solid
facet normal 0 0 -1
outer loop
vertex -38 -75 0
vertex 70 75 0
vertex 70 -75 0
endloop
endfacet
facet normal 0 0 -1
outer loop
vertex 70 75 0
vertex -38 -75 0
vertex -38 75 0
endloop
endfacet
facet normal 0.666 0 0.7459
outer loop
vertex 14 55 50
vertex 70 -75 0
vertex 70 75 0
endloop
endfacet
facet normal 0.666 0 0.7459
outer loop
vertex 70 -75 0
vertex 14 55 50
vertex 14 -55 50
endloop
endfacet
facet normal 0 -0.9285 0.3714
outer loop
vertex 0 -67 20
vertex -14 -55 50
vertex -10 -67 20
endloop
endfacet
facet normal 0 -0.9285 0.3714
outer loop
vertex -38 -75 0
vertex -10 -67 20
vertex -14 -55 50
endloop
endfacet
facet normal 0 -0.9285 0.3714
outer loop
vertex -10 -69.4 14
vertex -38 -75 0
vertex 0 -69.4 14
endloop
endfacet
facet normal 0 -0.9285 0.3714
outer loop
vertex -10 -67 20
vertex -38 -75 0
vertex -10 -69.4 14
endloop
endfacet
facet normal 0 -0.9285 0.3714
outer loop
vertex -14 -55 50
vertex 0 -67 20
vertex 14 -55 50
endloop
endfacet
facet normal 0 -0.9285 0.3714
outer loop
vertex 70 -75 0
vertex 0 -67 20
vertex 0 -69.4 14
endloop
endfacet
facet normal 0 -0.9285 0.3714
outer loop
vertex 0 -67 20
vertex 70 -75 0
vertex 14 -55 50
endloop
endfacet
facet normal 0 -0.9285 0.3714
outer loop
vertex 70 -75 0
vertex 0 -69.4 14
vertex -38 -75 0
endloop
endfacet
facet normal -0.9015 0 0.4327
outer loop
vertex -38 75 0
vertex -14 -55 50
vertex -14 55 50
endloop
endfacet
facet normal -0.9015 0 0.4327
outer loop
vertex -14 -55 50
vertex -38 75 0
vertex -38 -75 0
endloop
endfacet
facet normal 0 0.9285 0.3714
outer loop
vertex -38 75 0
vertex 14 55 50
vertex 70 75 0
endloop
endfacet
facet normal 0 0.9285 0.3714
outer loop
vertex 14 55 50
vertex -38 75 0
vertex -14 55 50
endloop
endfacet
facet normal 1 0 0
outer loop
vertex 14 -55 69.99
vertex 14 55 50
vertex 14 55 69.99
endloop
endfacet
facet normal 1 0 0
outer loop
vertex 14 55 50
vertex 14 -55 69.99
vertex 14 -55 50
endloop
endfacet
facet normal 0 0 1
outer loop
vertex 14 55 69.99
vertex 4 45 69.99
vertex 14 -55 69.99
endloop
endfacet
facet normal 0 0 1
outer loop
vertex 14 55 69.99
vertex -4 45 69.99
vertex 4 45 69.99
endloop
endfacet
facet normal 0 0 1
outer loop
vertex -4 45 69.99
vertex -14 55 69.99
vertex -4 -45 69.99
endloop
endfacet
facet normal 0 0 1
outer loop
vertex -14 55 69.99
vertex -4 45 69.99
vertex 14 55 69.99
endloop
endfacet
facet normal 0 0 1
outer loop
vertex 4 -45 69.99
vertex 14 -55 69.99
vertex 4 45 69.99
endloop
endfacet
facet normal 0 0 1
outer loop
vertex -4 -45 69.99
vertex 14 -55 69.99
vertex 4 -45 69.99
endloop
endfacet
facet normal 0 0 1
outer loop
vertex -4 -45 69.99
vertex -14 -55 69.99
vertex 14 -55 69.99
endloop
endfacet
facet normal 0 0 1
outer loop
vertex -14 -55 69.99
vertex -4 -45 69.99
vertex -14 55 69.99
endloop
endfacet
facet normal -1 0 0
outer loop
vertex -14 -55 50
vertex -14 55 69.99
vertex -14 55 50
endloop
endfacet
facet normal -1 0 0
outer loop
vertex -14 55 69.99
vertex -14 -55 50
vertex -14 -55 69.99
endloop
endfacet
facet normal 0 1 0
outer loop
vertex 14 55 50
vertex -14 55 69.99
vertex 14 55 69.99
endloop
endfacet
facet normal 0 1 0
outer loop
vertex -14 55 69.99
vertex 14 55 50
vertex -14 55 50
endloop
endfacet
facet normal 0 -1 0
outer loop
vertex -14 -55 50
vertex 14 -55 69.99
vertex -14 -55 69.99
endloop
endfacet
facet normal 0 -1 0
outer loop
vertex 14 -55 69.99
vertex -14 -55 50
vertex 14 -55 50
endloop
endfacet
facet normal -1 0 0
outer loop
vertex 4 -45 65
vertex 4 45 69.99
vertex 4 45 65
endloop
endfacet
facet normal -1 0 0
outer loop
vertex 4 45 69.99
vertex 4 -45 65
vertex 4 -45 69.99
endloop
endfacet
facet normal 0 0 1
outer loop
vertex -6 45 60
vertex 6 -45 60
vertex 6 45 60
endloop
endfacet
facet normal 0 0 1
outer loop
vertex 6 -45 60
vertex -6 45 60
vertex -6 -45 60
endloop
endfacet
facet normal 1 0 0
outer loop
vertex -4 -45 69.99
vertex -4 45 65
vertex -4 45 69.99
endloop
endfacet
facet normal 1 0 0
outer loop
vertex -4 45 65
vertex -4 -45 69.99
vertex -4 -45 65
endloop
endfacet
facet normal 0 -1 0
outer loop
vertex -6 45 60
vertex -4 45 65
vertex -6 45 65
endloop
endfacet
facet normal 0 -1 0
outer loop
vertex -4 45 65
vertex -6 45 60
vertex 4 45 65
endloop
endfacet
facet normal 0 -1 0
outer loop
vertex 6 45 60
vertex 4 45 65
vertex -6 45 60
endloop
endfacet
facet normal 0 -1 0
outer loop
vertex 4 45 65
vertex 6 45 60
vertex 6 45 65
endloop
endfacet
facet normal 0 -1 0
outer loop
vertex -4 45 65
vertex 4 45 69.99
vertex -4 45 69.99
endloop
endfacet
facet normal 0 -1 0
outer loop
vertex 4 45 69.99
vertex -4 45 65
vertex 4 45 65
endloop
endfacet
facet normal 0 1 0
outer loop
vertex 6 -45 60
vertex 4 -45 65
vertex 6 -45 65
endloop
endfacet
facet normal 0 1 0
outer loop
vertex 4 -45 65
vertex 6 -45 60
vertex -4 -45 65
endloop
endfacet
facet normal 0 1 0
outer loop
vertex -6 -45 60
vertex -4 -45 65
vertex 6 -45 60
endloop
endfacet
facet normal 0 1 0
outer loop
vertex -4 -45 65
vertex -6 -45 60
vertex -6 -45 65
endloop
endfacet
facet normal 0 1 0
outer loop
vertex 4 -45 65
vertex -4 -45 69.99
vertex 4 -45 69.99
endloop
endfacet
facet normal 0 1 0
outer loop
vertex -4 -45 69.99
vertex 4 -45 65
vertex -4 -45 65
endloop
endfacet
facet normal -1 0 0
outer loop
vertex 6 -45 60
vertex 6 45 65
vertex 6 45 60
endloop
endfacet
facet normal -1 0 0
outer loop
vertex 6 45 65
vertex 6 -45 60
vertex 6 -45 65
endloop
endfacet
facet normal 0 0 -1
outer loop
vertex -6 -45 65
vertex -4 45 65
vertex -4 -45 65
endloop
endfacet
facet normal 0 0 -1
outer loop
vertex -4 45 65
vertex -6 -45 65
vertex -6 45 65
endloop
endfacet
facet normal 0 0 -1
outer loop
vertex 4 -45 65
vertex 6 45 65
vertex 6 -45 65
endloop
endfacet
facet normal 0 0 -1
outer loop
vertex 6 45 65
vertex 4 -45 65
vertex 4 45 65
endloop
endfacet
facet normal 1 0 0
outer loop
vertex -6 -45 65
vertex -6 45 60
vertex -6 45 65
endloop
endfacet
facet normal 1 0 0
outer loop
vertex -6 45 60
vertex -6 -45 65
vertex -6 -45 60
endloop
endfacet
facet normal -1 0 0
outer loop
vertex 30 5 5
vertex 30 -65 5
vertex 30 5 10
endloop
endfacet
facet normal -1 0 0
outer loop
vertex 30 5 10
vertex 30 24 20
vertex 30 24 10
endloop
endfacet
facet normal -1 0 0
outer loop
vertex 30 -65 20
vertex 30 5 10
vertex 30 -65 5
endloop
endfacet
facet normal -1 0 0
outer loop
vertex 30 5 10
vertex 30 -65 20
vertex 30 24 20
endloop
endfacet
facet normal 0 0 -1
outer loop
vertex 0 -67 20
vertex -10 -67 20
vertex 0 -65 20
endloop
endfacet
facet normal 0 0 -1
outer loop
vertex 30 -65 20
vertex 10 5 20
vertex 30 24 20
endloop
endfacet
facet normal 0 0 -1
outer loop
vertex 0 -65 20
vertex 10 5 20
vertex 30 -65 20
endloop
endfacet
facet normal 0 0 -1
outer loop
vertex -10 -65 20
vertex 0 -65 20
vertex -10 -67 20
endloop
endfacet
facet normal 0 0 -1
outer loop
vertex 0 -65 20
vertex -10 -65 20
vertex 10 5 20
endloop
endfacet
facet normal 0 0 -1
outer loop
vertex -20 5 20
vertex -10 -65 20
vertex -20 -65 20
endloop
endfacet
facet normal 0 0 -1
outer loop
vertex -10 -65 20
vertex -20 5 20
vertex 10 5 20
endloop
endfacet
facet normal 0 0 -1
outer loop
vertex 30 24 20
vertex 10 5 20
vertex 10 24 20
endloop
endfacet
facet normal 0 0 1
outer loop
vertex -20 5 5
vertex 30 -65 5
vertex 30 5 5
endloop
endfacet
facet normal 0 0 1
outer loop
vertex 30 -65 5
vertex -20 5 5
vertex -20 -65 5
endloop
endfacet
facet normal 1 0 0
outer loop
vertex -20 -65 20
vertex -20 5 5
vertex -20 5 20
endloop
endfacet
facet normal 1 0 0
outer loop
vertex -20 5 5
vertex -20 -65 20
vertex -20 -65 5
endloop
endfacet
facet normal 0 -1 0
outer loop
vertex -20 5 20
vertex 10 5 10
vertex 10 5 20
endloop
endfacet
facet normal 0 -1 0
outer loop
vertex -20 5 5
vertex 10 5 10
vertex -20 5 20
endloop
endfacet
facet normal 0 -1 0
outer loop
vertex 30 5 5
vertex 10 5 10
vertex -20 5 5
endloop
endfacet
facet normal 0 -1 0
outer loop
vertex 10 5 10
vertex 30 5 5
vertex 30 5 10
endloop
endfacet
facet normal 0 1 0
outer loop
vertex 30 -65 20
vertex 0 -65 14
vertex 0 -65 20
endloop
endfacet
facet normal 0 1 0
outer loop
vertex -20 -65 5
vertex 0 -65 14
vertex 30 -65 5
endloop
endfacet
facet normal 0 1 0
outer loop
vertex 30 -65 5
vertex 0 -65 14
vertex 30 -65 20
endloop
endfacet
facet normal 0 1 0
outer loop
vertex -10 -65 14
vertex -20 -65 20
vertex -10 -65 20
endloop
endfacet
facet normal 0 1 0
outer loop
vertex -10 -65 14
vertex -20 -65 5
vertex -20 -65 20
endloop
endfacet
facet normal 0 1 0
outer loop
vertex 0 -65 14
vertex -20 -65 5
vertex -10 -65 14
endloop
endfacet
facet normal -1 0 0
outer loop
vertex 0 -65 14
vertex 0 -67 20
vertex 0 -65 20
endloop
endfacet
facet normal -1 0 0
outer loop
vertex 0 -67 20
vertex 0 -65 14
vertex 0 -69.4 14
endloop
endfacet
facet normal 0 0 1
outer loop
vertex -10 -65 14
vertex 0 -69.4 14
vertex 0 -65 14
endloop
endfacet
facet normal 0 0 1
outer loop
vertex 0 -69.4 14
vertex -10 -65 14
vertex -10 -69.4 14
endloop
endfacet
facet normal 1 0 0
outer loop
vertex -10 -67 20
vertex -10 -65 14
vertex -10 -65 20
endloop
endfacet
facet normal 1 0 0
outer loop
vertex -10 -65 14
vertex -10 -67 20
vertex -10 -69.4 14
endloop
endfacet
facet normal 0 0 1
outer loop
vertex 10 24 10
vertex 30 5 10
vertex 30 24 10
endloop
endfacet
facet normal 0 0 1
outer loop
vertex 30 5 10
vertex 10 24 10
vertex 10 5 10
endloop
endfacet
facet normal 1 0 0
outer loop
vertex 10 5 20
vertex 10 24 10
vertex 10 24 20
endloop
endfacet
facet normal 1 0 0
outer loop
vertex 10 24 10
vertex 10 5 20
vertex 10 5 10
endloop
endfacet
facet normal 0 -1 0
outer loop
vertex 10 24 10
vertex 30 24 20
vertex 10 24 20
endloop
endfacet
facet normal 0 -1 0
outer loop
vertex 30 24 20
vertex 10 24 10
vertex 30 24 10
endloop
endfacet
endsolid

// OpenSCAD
// file: scheda_forata.scad
/*
3D printable base for a CNC milled lamp
Copyright ©2021 Massimo Gismondi

This program is free software: you can redistribute it and/or modify
it under the terms of the GNU General Public License as published by
the Free Software Foundation, either version 3 of the License, or
(at your option) any later version.

This program is distributed in the hope that it will be useful,
but WITHOUT ANY WARRANTY; without even the implied warranty of
MERCHANTABILITY or FITNESS FOR A PARTICULAR PURPOSE.  See the
GNU General Public License for more details.

You should have received a copy of the GNU General Public License
along with this program.  If not, see <https://www.gnu.org/licenses/>.

*/


module scheda_forata(scheda_larg, scheda_lung)
{
    color([0,0.7 ,0])
    {   
        union()
        {
            // Basetta forata con saldature
            cube([scheda_larg, scheda_lung, 15]);
        
            //Porta usb
            translate([10, -10, 9])
                {
                 cube([10,20,6]);
            };
        
            // Spazio cavi in uscita
            translate([scheda_larg-20, scheda_lung-1, 5])
            {
                 cube([20,20,10]);
            };
        };
    };
};
// file: base_miroku.scad
/*
3D printable base for a CNC milled lamp
Copyright ©2021 Massimo Gismondi

This program is free software: you can redistribute it and/or modify
it under the terms of the GNU General Public License as published by
the Free Software Foundation, either version 3 of the License, or
(at your option) any later version.

This program is distributed in the hope that it will be useful,
but WITHOUT ANY WARRANTY; without even the implied warranty of
MERCHANTABILITY or FITNESS FOR A PARTICULAR PURPOSE.  See the
GNU General Public License for more details.

You should have received a copy of the GNU General Public License
along with this program.  If not, see <https://www.gnu.org/licenses/>.

*/

module base(basi, basi_sopra, altezza)
{
translate([-basi[0]/2, -basi[1]/2, 0])
//translate([0, 0, 0])
{
    epsilon = 0.01;
    
    union(){
        base_x = basi[0];
        base_y = basi[1];
        base_altezza = altezza;
        
        top_base_x = basi_sopra[0];
        top_base_y = basi_sopra[1];
        
        scarto_x = top_base_x - base_x;
        scarto_y = top_base_y - base_y;
        
        base_move_x_base = scarto_x/5;
        
        polyhedron(
        [
            [0-base_move_x_base, 0, 0],
            [0-base_move_x_base, base_y, 0],
            [base_x-base_move_x_base, base_y, 0],
            [base_x-base_move_x_base, 0, 0],
            [-scarto_x/2, -scarto_y/2, base_altezza],
            [-scarto_x/2, top_base_y-scarto_y/2, base_altezza],
            [top_base_x -scarto_x/2, top_base_y -scarto_y/2 , base_altezza],
            [top_base_x-scarto_x/2, -scarto_y/2, base_altezza]
        ],
        [
            [0, 3, 2, 1],
            [4, 5, 6, 7],
            [0, 1, 5, 4],
            [1, 2, 6, 5],
            [2, 3, 7, 6],
            [3, 0 ,4, 7]
        ]
        );
        
        //color([1,0 ,0])
        translate([-scarto_x/2, -scarto_y/2, base_altezza-epsilon])
        {
            cube([top_base_x, top_base_y, 20]);
        };
    }
};

};
// file: pannello_inciso.scad
/*
3D printable base for a CNC milled lamp
Copyright ©2021 Massimo Gismondi

This program is free software: you can redistribute it and/or modify
it under the terms of the GNU General Public License as published by
the Free Software Foundation, either version 3 of the License, or
(at your option) any later version.

This program is distributed in the hope that it will be useful,
but WITHOUT ANY WARRANTY; without even the implied warranty of
MERCHANTABILITY or FITNESS FOR A PARTICULAR PURPOSE.  See the
GNU General Public License for more details.

You should have received a copy of the GNU General Public License
along with this program.  If not, see <https://www.gnu.org/licenses/>.

*/


module pannello_inciso(larghezza, spessore, altezza)
{
    color([0.8, 0.8, 0.8])
    {
        union()
        {
            cube([spessore, larghezza, altezza], center=true);
        
            spessore_strip = 12;
            altezza_strip = 5;
            translate([-spessore_strip/2, -larghezza/2, -altezza/2])
            {
                cube([spessore_strip, larghezza, altezza_strip]);
            };
        };
        
            
    };
};
// main file
/*
3D printable base for a CNC milled lamp
Copyright ©2021 Massimo Gismondi

This program is free software: you can redistribute it and/or modify
it under the terms of the GNU General Public License as published by
the Free Software Foundation, either version 3 of the License, or
(at your option) any later version.

This program is distributed in the hope that it will be useful,
but WITHOUT ANY WARRANTY; without even the implied warranty of
MERCHANTABILITY or FITNESS FOR A PARTICULAR PURPOSE.  See the
GNU General Public License for more details.

You should have received a copy of the GNU General Public License
along with this program.  If not, see <https://www.gnu.org/licenses/>.

*/


include <pannello_inciso.scad>;
include <base_miroku.scad>;
include <scheda_forata.scad>;

// miroku plexiglass
spessore_miroku = 8;
larghezza_miroku = 90;
altezza_miroku = 135;

altezza_da_terra = 60;




base_x = spessore_miroku+100;
base_y = larghezza_miroku+60;
base_altezza = altezza_da_terra - 10;
top_base_x = spessore_miroku +20;
top_base_y = larghezza_miroku +20;


scheda_larg=50;
scheda_lung = 70;


difference()
{
    // base
    base(
    [base_x, base_y],
    [top_base_x, top_base_y],
    base_altezza
    );
    
    //Pannello inciso
    translate([0, 0, altezza_miroku/2 + altezza_da_terra])
    {
        pannello_inciso(larghezza_miroku, spessore_miroku, altezza_miroku);
    };
    
    // Scheda elettronica
    translate([-scheda_larg/2+5, -base_y/2+10, 5])
    {
        // DA FARE UNION NEL FILE SCHEDA_FORATA
        scheda_forata(scheda_larg, scheda_lung);
    };
};
